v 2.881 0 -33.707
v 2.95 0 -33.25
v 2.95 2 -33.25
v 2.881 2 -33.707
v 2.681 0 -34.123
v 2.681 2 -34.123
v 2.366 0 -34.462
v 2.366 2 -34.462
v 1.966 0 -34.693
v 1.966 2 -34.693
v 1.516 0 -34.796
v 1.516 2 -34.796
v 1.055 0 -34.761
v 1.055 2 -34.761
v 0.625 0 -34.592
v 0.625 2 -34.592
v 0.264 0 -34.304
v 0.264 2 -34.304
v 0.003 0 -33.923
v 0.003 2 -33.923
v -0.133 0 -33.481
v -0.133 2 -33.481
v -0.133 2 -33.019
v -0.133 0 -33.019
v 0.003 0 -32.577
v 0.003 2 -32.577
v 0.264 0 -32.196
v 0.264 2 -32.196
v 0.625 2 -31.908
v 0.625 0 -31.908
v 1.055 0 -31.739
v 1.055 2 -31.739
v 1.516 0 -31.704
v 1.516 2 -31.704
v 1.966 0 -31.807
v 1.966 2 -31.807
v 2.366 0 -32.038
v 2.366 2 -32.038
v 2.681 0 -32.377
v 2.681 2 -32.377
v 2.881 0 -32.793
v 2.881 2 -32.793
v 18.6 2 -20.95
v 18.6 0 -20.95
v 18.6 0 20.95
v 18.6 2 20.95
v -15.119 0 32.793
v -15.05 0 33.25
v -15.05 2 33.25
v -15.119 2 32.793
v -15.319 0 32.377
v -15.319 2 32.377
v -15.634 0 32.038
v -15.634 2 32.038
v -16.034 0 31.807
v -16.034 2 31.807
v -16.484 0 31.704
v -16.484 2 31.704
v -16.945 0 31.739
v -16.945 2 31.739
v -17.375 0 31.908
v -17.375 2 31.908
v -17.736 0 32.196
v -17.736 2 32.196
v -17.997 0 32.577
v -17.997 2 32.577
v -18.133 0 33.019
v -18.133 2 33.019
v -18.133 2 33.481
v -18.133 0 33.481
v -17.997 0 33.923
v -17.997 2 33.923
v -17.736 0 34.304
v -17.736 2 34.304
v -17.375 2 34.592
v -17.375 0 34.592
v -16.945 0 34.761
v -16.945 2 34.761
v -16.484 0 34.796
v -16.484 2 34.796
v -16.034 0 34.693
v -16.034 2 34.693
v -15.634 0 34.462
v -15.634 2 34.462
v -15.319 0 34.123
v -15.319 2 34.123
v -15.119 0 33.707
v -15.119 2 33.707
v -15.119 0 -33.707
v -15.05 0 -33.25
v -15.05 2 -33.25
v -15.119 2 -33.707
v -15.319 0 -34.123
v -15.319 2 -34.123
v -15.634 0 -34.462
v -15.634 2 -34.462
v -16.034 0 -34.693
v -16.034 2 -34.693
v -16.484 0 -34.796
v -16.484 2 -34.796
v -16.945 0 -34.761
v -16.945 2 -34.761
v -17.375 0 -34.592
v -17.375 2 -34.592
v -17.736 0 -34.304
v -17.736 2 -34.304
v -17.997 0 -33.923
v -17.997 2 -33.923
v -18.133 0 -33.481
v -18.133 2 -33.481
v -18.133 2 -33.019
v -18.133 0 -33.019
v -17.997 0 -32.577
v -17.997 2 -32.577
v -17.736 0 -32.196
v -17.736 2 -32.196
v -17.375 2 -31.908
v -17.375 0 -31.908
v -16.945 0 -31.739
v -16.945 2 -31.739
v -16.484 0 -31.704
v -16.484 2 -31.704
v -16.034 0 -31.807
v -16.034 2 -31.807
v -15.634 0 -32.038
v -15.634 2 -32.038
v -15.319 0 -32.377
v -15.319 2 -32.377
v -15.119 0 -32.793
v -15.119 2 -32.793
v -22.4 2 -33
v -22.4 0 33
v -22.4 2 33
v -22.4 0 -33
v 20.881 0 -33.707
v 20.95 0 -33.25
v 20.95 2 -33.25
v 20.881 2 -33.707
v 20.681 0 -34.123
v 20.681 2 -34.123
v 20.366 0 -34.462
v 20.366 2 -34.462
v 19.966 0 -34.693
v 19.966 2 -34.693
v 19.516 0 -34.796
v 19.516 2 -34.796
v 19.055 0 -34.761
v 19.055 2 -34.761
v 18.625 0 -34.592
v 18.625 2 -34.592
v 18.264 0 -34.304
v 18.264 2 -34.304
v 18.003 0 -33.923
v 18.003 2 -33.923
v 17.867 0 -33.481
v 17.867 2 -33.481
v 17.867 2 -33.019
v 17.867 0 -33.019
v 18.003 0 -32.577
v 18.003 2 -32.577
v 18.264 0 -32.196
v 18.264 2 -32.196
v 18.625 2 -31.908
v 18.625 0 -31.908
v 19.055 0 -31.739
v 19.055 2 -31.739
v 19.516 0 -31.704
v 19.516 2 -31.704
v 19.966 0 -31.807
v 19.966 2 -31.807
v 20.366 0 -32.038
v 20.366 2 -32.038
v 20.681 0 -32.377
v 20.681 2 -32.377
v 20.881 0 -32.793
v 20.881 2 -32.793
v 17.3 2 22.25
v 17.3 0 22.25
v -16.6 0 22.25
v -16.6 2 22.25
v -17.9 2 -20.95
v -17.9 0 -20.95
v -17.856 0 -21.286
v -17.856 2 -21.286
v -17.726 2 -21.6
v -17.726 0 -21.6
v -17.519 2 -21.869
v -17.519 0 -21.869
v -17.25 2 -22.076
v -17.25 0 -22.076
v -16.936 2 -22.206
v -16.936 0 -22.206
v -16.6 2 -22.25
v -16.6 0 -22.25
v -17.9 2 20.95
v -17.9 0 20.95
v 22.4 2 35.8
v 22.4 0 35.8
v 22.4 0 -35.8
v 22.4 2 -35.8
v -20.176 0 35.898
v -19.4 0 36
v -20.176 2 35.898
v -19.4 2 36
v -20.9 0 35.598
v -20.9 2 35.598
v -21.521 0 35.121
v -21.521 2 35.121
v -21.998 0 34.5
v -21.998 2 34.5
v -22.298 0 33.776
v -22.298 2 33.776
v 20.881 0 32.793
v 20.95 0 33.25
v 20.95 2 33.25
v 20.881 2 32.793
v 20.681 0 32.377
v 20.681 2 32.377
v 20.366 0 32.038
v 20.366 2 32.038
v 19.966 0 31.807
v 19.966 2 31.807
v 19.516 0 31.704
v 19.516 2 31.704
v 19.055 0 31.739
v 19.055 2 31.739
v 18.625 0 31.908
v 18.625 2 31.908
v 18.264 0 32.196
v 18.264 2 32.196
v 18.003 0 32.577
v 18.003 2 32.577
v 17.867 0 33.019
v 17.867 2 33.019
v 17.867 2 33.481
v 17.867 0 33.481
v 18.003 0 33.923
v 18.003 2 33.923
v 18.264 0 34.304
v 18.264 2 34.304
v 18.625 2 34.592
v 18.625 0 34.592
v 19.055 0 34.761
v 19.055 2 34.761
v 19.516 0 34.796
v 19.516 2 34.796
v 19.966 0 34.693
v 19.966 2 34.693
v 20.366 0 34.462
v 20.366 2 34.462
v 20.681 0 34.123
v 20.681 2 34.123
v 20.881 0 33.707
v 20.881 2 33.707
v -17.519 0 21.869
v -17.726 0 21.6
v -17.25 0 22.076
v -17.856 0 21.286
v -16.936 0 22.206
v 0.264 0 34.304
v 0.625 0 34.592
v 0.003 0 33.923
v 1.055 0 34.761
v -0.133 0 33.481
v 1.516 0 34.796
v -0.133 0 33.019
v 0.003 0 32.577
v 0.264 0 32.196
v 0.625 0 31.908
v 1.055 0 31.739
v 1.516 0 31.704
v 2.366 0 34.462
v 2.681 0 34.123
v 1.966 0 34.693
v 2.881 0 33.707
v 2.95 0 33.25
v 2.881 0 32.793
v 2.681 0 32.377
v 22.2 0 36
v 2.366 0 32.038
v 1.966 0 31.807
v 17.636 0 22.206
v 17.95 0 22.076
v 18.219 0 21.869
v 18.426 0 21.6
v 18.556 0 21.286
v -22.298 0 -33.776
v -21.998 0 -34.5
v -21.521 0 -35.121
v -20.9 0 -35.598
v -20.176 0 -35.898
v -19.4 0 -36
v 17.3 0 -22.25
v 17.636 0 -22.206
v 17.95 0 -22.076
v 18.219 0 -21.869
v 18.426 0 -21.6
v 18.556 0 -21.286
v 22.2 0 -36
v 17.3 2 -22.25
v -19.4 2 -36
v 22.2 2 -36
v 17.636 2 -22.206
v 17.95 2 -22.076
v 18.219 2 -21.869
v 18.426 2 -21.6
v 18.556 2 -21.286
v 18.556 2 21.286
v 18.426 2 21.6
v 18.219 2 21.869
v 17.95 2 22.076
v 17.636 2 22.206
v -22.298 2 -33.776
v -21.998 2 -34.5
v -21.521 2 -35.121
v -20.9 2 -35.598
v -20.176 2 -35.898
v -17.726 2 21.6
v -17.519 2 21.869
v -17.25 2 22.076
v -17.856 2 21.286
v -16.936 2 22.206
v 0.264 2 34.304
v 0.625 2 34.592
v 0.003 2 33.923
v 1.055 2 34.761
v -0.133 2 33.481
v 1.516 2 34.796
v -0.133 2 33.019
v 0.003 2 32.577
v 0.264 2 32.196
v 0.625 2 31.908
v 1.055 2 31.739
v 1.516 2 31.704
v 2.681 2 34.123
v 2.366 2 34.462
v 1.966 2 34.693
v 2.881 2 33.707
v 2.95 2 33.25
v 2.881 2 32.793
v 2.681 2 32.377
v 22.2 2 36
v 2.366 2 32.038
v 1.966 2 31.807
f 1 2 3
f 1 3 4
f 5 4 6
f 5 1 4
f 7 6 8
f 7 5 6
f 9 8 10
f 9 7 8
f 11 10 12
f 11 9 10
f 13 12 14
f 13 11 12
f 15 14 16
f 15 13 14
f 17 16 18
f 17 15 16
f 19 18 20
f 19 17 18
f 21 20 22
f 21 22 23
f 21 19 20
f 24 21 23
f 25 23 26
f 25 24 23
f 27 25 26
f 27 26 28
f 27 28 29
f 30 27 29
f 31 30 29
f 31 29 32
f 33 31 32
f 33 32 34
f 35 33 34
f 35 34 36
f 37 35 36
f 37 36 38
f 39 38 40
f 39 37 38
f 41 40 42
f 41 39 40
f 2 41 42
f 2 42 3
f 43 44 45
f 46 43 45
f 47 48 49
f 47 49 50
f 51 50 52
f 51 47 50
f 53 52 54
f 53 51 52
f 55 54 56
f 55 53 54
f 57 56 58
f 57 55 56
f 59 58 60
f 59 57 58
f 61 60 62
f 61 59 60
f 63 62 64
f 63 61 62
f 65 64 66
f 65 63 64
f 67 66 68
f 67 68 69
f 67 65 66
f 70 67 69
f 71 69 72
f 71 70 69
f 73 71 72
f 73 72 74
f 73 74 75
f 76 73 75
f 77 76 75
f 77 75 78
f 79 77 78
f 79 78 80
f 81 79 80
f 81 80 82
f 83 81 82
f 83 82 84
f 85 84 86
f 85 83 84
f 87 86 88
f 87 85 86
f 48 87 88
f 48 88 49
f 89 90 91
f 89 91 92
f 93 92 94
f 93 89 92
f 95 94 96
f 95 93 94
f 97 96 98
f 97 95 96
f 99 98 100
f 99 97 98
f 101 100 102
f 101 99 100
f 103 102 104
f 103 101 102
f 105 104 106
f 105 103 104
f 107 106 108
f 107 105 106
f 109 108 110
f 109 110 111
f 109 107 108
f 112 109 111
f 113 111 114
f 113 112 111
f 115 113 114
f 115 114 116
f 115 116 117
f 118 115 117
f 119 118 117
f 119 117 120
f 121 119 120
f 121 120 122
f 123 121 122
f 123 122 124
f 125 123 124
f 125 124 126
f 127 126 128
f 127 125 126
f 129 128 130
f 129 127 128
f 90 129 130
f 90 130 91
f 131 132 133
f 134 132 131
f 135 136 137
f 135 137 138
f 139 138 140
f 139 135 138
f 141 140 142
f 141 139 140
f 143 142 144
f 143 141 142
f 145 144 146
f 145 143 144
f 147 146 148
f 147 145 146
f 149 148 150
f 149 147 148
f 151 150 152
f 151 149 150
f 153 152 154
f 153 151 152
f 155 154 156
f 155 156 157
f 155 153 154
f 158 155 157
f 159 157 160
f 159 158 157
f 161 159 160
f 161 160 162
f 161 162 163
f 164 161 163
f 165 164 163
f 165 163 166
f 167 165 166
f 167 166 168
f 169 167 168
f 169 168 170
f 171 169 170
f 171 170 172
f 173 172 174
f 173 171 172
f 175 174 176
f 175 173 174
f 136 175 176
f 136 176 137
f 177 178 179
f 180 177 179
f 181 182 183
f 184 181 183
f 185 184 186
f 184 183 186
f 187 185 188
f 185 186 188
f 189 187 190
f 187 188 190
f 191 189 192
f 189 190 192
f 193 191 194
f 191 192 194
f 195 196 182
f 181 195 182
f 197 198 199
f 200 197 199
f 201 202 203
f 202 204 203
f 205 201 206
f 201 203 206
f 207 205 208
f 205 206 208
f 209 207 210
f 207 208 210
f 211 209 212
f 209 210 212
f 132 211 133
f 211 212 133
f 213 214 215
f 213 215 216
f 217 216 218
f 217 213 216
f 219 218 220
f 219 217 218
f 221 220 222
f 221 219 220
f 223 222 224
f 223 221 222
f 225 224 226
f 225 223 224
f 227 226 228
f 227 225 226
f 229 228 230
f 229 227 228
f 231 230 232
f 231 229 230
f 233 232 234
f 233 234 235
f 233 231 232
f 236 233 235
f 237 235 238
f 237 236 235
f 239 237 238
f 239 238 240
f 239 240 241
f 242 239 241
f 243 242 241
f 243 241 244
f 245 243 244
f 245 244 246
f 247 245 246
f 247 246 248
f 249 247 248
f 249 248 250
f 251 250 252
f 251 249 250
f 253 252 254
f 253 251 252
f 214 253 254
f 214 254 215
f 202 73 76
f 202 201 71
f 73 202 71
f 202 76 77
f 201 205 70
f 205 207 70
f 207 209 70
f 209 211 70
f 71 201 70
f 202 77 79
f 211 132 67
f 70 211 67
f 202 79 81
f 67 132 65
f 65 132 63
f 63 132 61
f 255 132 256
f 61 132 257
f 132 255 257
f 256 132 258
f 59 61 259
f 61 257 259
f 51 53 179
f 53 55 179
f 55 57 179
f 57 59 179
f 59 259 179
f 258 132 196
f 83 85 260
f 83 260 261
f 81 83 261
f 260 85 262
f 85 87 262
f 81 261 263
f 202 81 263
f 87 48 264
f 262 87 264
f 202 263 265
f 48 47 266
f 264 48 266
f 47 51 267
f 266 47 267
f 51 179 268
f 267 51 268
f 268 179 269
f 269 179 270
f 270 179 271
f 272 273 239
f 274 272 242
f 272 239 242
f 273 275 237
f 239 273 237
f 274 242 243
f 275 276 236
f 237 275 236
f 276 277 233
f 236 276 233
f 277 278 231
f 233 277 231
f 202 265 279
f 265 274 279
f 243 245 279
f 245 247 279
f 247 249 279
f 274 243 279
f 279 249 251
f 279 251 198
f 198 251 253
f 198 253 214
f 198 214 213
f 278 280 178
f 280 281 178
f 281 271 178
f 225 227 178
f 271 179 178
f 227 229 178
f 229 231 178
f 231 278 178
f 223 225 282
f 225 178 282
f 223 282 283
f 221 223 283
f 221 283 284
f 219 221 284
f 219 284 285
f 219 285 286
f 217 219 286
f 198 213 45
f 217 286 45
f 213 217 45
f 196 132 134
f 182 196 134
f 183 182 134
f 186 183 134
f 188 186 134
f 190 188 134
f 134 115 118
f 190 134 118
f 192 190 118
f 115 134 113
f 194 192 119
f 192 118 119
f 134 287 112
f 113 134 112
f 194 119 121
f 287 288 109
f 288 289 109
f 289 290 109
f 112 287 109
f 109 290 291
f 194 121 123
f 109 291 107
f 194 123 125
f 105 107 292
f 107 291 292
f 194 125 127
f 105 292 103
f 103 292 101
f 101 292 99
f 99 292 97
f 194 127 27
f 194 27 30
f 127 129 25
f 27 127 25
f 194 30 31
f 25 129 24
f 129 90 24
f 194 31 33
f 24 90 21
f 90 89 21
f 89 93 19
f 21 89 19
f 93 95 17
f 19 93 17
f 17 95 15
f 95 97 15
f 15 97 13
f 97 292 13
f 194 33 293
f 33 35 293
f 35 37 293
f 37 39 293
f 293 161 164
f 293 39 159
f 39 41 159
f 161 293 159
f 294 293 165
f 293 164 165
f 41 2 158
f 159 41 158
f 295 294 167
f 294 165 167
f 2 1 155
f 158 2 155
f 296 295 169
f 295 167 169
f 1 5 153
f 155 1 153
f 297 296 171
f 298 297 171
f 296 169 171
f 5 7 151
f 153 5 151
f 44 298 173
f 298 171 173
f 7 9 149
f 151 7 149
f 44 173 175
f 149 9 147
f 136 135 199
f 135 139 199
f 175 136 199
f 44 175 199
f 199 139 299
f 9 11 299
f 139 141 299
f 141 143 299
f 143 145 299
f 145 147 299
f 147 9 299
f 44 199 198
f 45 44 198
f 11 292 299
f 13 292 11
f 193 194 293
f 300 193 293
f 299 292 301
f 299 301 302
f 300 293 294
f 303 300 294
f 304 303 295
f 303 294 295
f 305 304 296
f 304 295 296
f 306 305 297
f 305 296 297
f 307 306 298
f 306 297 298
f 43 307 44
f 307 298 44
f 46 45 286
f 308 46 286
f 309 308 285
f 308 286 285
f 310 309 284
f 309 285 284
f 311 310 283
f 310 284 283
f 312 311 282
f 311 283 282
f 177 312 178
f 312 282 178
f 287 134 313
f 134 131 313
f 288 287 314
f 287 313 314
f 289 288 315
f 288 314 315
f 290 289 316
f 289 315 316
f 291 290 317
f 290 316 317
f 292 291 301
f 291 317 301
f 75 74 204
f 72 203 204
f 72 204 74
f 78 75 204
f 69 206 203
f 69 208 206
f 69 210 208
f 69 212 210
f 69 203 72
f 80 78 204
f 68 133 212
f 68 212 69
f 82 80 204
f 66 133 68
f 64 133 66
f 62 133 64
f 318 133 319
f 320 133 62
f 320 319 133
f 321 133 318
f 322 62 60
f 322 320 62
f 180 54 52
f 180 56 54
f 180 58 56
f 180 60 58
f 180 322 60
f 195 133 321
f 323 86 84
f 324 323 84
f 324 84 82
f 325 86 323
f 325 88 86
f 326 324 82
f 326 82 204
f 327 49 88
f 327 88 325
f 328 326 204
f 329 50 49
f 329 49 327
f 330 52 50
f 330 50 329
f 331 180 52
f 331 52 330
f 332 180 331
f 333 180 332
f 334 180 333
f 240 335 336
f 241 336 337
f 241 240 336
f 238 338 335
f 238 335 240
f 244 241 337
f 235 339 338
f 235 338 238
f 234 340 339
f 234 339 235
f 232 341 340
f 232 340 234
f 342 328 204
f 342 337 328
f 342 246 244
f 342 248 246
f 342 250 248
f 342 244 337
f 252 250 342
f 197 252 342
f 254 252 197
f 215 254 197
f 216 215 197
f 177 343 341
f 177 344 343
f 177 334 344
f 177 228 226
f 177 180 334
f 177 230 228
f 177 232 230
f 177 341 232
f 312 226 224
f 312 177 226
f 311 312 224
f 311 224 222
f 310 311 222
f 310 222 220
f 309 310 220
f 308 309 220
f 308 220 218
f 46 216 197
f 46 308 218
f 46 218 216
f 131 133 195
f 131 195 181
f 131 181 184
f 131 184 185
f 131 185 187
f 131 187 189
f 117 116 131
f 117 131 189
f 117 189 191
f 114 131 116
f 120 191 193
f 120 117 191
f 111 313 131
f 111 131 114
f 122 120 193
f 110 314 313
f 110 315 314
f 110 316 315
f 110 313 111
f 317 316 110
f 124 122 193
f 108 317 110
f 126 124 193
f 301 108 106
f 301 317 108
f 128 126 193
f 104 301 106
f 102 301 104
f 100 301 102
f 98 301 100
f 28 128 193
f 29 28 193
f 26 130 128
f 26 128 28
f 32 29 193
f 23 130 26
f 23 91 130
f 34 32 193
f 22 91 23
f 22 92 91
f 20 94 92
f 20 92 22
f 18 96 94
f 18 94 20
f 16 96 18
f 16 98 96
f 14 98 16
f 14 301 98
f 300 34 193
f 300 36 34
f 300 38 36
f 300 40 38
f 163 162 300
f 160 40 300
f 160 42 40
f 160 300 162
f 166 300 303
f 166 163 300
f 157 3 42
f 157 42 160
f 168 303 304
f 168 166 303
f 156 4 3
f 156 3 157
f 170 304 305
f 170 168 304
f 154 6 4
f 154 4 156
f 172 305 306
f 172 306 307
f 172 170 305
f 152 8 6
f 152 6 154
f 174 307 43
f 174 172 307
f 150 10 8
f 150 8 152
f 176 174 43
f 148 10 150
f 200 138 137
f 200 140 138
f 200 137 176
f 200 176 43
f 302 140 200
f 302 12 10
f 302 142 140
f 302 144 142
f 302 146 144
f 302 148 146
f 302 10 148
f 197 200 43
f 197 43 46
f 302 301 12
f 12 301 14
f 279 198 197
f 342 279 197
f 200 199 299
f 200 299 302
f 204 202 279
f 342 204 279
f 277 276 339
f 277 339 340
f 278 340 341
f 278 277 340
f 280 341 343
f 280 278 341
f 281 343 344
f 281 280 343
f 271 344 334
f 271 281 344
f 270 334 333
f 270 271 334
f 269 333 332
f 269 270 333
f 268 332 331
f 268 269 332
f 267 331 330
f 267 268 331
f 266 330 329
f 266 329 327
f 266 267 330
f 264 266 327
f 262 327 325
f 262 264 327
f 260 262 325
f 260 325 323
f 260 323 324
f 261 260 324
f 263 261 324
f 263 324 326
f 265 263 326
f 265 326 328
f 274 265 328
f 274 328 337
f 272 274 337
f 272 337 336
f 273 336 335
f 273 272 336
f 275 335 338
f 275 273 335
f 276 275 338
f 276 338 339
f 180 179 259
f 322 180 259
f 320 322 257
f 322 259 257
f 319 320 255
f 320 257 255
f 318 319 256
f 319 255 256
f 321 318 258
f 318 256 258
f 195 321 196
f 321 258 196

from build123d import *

# Parameters (mm, degrees)
SKETCH1_W           = 44.8
SKETCH1_H           = 72
SKETCH1_R           = 1.55
BOSS_EXTRUDE1_DEPTH = 2
CHAMFER2_SIZE       = 0.2
FILLET3_R           = 3


with BuildPart() as part:
    # Sketch1 → Boss-Extrude1 (new body)
    with BuildSketch(Plane(origin=(0, 0, 0), x_dir=(1, 0, 0), z_dir=(0, 1, 0))):
        Rectangle(SKETCH1_W, SKETCH1_H)
        with Locations((-16.6, -33.25)):
            Circle(SKETCH1_R, mode=Mode.SUBTRACT)
        with Locations((1.4, -33.25)):
            Circle(SKETCH1_R, mode=Mode.SUBTRACT)
        with Locations((19.4, -33.25)):
            Circle(SKETCH1_R, mode=Mode.SUBTRACT)
        with Locations((-16.6, 33.25)):
            Circle(SKETCH1_R, mode=Mode.SUBTRACT)
        with Locations((1.4, 33.25)):
            Circle(SKETCH1_R, mode=Mode.SUBTRACT)
        with Locations((19.4, 33.25)):
            Circle(SKETCH1_R, mode=Mode.SUBTRACT)
        with BuildLine():
            Line((17.3, -22.25), (-16.6, -22.25))
            ThreePointArc((-16.6, -22.25), (-17.519238816, -21.869238816), (-17.9, -20.95))
            Line((-17.9, -20.95), (-17.9, 20.95))
            ThreePointArc((-17.9, 20.95), (-17.519238816, 21.869238816), (-16.6, 22.25))
            Line((-16.6, 22.25), (17.3, 22.25))
            ThreePointArc((17.3, 22.25), (18.219238816, 21.869238816), (18.6, 20.95))
            Line((18.6, 20.95), (18.6, -20.95))
            ThreePointArc((18.6, -20.95), (18.219238816, -21.869238816), (17.3, -22.25))
        make_face(mode=Mode.SUBTRACT)
    extrude(amount=BOSS_EXTRUDE1_DEPTH)

    # Chamfer2
    chamfer2_edges = [part.edges().sort_by_distance(p)[0] for p in [
        (22.4, 1, -36),
        (22.4, 1, 36),
    ]]
    chamfer(chamfer2_edges, length=CHAMFER2_SIZE)

    # Fillet3
    fillet3_edges = [part.edges().sort_by_distance(p)[0] for p in [
        (-22.4, 1, 36),
        (-22.4, 1, -36),
    ]]
    fillet(fillet3_edges, radius=FILLET3_R)


solid = part.part
